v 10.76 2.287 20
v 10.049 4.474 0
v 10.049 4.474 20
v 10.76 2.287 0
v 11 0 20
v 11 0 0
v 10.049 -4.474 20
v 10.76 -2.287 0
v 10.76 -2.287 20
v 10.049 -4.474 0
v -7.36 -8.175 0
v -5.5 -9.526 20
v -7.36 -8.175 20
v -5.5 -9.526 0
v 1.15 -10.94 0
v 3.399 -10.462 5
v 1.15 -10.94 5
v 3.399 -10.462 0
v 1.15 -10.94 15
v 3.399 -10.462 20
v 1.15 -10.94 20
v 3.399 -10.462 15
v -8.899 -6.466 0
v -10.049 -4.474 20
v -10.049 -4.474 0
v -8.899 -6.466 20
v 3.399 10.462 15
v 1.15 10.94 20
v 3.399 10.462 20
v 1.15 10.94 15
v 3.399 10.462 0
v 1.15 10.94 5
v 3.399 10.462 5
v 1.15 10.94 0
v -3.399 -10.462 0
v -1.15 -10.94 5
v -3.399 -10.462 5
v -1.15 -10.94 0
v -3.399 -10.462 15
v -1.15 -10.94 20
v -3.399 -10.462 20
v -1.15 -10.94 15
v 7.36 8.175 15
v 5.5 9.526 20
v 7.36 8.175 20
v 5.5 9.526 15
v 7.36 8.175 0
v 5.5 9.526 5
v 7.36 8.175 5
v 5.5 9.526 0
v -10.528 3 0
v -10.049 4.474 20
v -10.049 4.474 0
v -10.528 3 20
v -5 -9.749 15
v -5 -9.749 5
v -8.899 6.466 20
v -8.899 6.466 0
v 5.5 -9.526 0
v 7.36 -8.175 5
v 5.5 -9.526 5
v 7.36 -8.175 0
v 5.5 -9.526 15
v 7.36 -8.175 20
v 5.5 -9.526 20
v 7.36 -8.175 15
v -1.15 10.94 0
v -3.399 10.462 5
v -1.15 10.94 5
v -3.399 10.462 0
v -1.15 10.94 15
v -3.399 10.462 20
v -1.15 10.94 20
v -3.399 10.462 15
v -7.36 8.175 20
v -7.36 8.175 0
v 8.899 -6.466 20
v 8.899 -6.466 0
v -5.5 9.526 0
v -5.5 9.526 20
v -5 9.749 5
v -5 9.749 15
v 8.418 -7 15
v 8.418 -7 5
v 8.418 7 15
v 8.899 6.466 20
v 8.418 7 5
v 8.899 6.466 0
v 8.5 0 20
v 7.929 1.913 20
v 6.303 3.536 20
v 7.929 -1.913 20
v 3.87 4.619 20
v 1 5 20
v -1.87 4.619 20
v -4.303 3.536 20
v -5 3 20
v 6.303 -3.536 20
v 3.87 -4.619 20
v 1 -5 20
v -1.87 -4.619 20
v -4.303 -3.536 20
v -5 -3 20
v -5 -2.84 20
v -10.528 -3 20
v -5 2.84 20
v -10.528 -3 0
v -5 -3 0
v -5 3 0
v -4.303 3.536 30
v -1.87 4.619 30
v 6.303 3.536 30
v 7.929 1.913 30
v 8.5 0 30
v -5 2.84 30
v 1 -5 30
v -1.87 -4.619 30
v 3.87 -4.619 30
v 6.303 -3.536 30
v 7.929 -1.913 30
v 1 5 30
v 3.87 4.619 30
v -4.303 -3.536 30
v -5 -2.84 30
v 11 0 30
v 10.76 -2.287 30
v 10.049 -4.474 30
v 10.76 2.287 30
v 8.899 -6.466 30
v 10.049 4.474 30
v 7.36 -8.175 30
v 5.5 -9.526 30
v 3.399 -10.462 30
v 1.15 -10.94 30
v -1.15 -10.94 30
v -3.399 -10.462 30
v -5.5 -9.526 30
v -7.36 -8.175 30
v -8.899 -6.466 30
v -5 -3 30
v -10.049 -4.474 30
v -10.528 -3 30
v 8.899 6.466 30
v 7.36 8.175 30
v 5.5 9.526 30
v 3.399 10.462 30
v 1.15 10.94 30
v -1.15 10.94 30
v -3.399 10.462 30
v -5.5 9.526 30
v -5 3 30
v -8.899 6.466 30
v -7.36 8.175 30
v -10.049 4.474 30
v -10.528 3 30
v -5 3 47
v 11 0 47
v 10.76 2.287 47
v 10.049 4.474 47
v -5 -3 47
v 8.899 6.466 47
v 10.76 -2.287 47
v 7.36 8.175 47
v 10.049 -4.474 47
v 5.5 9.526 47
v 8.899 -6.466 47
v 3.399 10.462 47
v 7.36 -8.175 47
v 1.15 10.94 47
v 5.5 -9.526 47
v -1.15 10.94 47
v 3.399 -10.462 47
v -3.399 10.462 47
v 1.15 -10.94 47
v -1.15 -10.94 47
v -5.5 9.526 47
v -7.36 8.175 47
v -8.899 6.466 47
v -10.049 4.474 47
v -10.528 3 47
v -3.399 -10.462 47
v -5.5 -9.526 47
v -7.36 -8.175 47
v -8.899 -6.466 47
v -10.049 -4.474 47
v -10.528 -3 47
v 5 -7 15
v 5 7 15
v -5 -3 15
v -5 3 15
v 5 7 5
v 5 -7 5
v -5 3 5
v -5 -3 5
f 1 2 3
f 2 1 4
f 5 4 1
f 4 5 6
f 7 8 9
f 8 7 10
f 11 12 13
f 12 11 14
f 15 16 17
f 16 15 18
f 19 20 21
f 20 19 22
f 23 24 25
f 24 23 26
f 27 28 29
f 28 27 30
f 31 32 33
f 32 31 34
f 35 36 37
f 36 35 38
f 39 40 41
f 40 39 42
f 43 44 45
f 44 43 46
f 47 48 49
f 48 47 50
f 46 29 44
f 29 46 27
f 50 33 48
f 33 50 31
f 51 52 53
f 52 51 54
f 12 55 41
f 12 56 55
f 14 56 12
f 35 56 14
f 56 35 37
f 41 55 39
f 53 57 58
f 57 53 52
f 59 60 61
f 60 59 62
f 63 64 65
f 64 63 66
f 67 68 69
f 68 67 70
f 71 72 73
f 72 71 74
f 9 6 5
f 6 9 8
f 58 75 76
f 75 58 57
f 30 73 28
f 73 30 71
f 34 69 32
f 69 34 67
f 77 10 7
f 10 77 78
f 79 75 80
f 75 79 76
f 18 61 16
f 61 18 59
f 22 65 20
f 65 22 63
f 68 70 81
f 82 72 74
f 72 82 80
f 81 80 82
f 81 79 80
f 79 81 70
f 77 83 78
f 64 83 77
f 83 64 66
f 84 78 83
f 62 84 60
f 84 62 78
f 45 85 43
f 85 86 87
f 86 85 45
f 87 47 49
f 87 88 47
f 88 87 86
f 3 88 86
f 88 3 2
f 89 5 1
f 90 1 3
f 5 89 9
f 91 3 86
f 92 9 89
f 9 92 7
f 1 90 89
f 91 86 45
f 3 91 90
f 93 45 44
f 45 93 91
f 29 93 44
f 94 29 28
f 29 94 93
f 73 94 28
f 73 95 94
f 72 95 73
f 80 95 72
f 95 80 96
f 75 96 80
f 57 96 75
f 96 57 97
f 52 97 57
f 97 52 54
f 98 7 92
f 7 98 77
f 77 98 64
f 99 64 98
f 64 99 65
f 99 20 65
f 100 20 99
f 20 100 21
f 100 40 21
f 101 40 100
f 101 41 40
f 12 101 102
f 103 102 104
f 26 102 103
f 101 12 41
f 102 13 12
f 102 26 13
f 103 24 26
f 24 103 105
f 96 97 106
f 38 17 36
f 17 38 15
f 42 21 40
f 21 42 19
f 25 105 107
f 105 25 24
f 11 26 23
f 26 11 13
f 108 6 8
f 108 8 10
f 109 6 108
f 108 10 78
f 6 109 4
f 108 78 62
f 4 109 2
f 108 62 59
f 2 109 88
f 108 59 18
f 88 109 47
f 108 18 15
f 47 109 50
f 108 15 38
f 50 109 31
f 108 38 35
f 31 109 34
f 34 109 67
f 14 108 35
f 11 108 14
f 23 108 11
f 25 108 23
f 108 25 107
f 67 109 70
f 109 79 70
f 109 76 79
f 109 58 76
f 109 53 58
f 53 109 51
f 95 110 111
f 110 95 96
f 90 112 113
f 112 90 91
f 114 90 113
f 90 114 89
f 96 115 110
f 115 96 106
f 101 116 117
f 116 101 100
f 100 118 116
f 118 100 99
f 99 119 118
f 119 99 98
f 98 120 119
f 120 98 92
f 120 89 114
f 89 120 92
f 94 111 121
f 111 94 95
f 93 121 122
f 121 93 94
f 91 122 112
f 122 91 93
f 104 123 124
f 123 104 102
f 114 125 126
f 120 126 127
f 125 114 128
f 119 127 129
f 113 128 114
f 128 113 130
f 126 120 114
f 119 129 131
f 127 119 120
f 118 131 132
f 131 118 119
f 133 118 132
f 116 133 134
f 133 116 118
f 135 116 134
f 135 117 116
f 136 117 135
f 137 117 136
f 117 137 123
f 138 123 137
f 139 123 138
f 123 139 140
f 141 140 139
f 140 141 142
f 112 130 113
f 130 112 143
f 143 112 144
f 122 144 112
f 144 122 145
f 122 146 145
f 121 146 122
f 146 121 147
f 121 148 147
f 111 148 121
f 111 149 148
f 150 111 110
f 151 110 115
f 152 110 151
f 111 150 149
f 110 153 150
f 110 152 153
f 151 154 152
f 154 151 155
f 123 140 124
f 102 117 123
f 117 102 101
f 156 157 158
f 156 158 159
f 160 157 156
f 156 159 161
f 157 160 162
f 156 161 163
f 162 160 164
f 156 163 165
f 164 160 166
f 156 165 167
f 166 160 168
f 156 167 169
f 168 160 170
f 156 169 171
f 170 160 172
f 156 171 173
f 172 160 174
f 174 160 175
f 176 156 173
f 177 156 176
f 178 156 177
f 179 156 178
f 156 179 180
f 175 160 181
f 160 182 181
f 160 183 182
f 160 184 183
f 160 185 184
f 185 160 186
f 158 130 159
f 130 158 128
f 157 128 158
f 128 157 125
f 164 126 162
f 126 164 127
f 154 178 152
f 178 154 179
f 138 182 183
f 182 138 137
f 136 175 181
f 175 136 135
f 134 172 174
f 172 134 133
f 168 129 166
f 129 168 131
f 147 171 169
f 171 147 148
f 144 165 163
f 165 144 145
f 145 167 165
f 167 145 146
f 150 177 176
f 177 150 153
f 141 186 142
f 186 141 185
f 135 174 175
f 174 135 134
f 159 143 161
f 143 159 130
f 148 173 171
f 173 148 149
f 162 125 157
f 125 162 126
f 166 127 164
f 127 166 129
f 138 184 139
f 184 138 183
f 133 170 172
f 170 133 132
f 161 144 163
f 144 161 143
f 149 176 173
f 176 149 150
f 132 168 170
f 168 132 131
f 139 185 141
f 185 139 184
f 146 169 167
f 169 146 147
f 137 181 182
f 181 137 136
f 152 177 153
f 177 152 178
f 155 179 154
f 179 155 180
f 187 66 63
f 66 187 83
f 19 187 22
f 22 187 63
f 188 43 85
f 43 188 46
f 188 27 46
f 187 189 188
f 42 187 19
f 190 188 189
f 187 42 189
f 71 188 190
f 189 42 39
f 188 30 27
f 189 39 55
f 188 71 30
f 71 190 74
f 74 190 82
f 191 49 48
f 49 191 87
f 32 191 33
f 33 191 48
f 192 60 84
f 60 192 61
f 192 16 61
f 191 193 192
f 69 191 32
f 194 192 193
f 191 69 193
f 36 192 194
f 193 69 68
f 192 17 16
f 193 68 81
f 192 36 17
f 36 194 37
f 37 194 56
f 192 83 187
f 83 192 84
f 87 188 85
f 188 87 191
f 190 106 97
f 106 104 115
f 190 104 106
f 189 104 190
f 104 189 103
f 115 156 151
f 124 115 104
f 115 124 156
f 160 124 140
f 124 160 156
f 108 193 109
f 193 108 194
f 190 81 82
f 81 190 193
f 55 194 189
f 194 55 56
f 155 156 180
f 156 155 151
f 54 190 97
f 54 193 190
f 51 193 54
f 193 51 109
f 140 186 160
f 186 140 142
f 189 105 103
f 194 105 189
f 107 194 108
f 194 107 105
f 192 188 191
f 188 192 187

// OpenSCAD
// Author    Martin Dubois
// Copyright (C) 2025 Martin Dubois
// Product   Models3D
// File      Computer/OpenCase.scad

difference()
{
    union()
    {
        cylinder( ZIP_Z, BAT_R, BAT_R );

        translate( [ 1, 0, ZIP_Z ] )
        {
            scale( [ 1.5, 1, 1 ] )
                cylinder( ZIP_SZ, 5, 5 );
        }

        translate( [ 0, 0, ZIP_Z + ZIP_SZ ] )
            cylinder( BAT_SZ - ZIP_SZ - ZIP_Z, BAT_R, BAT_R );
    }

    translate( [ - BAT_R - EPS, - WIRE_R, - EPS ] )
        cube( [ EPS + WIRE_D, WIRE_D, 2 * EPS + BAT_SZ ] );

    translate( [ - 5, - BAT_R - EPS, 5 ] )
        cube( [ 10, 2 * EPS + BAT_D, 10 ] );

    for ( y = [ - 10, 7 ] )
    {
        translate( [ 5 - EPS, y, 5 ] )
            cube( [ EPS + 4, 3, 10 ] );
    }
}

BAT_R  = 11;
BAT_SZ = 47;

EPS = 0.1;

WIRE_R = 3;

ZIP_SZ = 10;
ZIP_Z  = 20;


BAT_D = 2 * BAT_R;

WIRE_D = 2 * WIRE_R;
